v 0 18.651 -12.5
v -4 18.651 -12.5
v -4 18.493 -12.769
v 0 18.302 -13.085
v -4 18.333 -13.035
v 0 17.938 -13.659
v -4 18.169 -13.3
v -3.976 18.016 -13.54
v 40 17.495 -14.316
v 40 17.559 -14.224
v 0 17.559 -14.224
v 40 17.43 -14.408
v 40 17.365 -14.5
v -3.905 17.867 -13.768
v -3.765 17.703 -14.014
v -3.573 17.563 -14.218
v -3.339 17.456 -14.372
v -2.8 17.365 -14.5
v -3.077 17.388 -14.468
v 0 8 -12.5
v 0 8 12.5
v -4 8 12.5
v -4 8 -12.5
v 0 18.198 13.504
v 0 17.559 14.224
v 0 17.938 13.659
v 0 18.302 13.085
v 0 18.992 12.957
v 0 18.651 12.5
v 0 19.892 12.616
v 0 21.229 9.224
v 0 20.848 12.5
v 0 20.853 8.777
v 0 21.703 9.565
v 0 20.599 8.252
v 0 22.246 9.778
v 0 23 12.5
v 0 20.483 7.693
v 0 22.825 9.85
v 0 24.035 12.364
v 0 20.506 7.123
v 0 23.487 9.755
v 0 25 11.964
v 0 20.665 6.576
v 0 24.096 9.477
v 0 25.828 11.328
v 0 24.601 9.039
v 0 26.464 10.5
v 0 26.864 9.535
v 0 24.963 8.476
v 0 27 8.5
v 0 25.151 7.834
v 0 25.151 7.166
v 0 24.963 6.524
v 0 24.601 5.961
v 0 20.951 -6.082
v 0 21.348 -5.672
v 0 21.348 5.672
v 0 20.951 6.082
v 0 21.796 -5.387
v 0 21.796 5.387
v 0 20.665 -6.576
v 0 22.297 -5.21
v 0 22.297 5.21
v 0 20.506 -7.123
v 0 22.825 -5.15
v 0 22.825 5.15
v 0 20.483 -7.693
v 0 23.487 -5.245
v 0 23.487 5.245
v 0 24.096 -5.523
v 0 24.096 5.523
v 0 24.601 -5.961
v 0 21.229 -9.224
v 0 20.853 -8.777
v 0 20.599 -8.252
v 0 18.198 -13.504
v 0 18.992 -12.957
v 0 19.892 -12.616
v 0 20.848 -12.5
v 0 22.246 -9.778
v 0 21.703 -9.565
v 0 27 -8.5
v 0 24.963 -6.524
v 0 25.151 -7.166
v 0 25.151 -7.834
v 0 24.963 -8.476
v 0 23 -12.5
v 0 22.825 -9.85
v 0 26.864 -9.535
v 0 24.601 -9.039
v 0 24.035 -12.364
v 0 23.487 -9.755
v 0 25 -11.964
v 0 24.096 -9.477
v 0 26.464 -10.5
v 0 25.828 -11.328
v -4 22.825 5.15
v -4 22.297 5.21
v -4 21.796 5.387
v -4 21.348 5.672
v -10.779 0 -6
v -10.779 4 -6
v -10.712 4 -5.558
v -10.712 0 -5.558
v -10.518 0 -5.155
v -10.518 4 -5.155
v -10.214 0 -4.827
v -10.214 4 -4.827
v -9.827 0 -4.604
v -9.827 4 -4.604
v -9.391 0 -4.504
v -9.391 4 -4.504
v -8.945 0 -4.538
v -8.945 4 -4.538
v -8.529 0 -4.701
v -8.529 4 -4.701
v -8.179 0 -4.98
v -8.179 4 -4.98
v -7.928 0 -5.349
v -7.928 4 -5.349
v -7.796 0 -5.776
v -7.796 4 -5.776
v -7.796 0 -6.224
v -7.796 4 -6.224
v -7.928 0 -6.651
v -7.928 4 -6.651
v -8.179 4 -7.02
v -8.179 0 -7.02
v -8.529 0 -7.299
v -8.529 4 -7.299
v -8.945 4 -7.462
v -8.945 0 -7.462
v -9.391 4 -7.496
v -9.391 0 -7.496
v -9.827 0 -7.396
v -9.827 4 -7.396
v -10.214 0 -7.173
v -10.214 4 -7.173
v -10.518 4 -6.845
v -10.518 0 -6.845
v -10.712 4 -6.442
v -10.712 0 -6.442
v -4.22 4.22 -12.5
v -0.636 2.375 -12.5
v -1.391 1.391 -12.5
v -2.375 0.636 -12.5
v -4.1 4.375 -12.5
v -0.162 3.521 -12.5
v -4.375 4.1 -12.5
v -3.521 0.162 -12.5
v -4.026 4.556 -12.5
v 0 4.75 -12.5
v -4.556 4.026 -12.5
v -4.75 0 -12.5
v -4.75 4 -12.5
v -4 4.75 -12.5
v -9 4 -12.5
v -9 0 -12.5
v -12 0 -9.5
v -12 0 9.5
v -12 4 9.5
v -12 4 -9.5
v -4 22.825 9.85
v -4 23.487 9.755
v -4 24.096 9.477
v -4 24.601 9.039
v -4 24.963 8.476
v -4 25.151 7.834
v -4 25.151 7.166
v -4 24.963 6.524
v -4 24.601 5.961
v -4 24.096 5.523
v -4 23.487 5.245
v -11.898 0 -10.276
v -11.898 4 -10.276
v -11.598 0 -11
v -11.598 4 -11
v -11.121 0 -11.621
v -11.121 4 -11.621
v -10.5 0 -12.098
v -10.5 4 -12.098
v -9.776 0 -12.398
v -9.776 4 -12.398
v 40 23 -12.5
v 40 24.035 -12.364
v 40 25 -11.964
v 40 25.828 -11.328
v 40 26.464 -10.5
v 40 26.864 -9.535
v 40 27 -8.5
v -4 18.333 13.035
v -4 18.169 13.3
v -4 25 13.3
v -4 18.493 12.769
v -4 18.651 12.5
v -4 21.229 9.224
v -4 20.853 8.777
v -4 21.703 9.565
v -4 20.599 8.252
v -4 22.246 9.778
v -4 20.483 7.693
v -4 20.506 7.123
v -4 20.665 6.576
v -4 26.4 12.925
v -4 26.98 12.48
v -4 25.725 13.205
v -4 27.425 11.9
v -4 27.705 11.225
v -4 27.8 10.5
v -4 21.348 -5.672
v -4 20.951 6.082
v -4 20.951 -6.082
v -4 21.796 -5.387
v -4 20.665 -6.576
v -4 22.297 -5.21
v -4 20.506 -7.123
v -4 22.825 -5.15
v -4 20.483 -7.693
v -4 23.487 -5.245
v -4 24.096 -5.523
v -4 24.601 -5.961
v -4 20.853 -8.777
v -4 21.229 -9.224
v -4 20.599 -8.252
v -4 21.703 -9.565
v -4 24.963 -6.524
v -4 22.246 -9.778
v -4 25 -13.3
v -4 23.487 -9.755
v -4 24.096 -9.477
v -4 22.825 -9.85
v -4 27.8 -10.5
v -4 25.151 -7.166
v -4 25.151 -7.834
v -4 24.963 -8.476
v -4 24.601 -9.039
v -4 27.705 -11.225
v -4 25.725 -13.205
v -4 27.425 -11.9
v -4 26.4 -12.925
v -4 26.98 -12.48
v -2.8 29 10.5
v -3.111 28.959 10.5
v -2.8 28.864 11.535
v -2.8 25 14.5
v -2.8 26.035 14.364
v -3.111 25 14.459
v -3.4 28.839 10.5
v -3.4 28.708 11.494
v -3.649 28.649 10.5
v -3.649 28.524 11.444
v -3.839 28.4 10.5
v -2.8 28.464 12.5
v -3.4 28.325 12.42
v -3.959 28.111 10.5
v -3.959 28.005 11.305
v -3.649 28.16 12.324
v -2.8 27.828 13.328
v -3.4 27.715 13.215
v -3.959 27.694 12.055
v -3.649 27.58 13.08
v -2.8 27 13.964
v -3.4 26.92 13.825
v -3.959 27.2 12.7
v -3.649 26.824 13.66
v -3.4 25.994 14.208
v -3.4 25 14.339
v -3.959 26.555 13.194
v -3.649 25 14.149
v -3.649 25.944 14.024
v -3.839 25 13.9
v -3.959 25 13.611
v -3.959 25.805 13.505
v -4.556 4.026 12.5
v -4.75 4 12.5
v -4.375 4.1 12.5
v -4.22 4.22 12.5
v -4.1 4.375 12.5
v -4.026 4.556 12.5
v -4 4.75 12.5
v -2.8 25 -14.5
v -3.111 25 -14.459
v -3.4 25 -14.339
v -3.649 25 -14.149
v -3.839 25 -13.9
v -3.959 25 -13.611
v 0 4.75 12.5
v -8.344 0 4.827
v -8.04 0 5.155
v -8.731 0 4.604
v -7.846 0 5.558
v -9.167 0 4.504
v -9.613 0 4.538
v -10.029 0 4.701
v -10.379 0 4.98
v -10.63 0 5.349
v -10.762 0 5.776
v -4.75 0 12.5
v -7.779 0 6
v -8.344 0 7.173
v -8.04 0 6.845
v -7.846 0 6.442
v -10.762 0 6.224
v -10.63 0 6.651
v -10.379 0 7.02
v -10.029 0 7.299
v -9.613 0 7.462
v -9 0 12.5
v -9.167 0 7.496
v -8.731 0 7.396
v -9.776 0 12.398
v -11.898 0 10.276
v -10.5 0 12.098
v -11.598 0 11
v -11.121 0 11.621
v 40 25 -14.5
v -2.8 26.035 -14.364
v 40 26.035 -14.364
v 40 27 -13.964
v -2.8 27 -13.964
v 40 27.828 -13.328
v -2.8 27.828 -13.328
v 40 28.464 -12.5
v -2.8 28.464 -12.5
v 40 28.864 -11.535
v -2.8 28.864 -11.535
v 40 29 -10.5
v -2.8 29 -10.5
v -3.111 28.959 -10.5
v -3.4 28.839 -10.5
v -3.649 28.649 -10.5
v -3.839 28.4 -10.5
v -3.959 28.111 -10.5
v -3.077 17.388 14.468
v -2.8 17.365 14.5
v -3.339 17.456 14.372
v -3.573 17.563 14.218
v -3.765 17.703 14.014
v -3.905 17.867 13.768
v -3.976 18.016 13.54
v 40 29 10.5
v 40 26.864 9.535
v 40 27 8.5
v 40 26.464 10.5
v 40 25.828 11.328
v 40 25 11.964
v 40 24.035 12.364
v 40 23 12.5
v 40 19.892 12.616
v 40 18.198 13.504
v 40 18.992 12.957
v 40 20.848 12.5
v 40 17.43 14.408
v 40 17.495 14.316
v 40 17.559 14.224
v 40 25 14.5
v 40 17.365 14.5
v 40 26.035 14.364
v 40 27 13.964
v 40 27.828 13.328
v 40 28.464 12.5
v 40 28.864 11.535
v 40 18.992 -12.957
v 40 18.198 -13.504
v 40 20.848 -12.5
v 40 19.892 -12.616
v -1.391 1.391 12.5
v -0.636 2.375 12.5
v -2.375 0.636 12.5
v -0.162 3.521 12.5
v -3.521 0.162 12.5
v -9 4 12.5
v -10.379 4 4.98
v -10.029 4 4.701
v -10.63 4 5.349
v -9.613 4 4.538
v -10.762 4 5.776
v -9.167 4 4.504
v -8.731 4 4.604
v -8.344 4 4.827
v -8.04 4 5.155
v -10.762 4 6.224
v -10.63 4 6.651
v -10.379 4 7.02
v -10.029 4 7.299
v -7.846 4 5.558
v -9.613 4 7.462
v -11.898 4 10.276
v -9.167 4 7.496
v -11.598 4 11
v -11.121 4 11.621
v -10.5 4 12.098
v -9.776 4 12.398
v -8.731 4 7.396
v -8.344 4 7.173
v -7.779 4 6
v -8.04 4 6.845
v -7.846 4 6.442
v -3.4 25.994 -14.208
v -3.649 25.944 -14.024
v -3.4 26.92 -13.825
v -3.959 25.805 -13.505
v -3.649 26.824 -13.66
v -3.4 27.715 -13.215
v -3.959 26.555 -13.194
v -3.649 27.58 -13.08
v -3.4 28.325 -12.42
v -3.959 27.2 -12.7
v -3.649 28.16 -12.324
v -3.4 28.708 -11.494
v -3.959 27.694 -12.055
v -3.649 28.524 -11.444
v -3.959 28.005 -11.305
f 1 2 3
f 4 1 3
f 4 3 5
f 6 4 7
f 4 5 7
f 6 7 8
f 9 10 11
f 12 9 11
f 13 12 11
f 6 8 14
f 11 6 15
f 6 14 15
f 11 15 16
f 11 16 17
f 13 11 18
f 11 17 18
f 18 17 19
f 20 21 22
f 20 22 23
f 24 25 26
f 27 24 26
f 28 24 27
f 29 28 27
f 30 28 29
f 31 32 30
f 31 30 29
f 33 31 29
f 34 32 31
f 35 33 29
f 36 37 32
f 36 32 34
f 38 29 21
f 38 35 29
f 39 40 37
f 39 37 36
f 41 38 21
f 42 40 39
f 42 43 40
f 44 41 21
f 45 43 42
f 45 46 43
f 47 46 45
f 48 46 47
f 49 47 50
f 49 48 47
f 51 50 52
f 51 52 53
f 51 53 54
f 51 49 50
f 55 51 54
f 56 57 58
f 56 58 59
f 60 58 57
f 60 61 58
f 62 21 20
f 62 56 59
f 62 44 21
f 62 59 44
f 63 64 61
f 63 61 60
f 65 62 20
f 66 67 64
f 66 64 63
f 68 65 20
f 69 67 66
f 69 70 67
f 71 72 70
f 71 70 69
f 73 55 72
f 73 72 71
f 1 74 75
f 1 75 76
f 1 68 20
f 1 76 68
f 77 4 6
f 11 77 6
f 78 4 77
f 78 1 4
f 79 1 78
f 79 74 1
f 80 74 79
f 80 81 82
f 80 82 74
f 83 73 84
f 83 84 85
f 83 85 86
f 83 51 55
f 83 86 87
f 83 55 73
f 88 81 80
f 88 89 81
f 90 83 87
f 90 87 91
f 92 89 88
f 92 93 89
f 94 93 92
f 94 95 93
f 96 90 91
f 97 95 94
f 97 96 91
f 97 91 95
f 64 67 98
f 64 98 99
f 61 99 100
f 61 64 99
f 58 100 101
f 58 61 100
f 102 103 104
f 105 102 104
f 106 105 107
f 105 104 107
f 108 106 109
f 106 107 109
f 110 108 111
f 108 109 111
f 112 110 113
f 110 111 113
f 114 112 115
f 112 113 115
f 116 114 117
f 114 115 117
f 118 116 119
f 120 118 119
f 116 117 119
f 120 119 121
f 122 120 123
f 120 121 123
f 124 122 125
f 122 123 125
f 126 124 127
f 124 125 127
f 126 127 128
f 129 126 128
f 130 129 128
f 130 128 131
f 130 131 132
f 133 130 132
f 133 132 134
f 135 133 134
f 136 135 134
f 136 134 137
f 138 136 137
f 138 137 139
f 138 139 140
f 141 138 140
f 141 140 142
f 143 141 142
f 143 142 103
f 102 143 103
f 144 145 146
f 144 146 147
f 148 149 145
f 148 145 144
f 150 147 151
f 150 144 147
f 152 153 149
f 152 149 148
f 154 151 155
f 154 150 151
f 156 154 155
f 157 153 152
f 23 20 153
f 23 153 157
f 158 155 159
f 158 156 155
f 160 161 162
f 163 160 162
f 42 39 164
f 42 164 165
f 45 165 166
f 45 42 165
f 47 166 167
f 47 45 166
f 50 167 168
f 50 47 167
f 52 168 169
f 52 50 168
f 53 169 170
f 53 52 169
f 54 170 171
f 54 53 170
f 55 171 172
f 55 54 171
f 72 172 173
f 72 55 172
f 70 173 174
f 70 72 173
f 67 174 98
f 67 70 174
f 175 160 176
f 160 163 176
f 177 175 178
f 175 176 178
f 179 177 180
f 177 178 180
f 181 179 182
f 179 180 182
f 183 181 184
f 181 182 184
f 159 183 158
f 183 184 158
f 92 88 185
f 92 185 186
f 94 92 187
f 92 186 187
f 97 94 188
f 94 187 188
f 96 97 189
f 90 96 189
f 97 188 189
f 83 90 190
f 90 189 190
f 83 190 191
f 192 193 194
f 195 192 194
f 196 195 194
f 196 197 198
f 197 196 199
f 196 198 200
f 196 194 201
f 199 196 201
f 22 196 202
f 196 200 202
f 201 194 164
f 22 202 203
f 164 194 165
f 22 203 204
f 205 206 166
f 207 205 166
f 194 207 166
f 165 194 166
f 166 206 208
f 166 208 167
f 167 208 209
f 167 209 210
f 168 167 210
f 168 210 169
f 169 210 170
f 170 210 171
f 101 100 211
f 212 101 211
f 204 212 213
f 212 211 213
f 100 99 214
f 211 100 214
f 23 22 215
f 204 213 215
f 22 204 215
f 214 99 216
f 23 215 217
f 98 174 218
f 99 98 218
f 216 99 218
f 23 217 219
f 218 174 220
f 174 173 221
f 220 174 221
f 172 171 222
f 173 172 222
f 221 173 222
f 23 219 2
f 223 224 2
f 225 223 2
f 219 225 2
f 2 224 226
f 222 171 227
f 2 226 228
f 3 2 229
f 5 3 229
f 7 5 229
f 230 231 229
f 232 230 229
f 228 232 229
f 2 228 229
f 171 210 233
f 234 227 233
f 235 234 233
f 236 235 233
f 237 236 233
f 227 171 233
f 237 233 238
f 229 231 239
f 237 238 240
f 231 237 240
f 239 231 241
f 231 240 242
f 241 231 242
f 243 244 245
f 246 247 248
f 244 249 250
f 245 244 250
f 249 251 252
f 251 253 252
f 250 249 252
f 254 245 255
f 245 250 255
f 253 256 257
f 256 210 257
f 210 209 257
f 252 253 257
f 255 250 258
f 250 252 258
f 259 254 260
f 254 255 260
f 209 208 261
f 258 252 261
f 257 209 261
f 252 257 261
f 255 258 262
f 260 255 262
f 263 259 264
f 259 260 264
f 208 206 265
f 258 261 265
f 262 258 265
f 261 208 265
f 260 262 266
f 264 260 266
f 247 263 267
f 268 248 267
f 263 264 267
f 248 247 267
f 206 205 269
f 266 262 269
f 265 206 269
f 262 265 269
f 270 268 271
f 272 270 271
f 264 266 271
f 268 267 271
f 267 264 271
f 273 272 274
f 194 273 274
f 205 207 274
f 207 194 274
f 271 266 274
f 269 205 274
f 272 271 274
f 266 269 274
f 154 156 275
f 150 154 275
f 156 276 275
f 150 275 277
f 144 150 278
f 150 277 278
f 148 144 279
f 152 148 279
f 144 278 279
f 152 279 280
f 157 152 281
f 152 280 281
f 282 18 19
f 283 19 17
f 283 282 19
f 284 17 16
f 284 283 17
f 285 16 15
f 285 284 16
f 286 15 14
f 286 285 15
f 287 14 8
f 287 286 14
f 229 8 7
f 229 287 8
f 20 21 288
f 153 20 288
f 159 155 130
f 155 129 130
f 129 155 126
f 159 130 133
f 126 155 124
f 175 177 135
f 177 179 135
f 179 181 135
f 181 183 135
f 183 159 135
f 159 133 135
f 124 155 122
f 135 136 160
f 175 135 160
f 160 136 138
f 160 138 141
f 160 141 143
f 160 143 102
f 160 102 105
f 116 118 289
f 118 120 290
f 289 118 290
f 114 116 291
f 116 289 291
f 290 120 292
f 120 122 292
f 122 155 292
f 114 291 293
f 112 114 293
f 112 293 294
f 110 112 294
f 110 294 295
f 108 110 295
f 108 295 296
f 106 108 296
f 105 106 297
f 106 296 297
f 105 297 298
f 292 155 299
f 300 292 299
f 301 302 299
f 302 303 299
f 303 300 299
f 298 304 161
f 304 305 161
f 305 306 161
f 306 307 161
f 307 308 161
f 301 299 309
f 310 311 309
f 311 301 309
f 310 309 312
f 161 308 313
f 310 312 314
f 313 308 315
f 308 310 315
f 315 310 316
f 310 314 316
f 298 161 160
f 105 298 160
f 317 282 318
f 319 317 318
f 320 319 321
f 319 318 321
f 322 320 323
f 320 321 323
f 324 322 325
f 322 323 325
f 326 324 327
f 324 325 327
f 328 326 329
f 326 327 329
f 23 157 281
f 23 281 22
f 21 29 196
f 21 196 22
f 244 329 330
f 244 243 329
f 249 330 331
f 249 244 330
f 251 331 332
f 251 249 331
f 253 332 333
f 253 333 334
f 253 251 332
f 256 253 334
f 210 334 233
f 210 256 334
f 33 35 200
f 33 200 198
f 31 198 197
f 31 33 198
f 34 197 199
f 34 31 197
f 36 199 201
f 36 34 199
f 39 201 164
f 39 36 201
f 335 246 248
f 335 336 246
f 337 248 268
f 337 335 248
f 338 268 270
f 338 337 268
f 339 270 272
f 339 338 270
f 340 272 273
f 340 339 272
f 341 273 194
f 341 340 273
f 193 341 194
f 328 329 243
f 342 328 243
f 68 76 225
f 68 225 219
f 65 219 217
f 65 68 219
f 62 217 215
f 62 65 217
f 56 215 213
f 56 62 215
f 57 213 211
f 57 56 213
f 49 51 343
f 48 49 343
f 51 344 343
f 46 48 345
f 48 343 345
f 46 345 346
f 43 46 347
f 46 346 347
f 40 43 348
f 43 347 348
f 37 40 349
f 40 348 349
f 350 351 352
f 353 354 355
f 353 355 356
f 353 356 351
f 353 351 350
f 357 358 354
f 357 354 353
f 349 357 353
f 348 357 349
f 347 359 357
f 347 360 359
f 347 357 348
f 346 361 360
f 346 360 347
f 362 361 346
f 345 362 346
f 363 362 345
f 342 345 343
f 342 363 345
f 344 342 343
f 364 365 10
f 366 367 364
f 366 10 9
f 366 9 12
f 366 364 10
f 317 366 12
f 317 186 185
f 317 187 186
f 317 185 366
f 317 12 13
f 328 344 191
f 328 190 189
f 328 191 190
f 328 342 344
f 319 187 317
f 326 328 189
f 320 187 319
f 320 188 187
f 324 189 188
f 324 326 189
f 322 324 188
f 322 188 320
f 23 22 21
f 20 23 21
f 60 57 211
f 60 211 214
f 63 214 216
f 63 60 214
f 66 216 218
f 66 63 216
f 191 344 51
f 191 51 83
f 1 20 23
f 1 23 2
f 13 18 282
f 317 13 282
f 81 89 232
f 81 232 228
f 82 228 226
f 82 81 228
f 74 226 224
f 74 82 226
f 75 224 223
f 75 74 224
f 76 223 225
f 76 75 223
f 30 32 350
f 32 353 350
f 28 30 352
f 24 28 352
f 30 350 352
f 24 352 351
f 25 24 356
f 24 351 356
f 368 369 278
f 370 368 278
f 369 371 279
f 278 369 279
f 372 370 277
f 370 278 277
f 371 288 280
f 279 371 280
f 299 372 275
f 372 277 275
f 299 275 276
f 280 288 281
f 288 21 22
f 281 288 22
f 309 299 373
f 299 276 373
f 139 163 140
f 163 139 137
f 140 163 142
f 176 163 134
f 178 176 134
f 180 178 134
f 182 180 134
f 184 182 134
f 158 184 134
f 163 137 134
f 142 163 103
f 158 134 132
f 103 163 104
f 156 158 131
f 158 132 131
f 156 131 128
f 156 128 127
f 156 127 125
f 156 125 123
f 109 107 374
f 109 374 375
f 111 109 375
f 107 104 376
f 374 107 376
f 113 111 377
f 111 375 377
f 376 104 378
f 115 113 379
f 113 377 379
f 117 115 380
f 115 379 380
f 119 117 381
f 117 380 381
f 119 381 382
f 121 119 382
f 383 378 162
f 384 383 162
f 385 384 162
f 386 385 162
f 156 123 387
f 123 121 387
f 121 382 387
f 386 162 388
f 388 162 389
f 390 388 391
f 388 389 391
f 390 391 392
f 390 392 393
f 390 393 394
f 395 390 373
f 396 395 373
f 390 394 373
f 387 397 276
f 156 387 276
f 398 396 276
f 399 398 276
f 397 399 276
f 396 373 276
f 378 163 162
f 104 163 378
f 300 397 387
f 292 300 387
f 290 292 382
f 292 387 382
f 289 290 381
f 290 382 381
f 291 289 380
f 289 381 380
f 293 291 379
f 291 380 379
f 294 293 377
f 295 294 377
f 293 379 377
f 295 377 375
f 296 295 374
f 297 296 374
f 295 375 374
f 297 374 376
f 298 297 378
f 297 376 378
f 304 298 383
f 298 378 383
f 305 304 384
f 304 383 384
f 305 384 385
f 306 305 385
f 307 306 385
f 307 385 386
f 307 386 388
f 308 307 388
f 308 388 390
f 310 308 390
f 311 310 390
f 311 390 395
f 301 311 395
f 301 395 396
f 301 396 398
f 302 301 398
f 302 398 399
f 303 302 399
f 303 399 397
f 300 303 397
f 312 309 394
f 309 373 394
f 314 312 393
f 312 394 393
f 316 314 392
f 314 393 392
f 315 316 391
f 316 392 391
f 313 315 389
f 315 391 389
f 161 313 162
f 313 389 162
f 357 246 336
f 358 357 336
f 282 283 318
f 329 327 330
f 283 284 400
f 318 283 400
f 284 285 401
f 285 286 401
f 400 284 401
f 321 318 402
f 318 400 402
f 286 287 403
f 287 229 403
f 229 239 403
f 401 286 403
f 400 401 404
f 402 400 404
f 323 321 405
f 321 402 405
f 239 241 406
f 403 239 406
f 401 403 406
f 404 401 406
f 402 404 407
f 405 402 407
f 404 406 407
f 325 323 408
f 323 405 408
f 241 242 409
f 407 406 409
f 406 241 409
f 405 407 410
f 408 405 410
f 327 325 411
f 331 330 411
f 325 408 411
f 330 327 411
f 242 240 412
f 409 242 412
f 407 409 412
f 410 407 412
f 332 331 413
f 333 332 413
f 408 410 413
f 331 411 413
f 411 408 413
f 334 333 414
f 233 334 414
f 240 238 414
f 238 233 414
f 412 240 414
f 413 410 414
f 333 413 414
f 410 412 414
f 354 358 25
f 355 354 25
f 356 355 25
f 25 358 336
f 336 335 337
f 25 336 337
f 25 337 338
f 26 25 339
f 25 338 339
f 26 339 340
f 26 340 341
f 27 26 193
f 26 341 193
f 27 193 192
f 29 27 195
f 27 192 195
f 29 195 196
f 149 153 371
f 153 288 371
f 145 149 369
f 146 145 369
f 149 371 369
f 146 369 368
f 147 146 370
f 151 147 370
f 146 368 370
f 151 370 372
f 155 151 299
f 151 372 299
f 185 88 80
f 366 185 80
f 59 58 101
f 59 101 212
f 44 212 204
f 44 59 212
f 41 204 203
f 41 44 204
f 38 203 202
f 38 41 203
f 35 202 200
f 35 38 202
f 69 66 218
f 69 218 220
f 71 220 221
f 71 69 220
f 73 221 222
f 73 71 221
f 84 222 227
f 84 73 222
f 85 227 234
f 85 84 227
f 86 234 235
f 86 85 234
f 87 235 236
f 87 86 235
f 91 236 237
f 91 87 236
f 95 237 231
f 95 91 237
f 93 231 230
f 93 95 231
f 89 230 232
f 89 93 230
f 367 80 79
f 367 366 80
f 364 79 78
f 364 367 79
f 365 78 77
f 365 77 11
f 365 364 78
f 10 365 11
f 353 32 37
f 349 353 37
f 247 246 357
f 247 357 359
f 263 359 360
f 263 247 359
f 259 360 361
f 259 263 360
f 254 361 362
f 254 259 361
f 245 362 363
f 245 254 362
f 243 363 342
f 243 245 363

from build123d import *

# Parameters (mm, degrees)
BASE_FLANGE1_DEPTH  = 12.5
FILLET1_R           = 3
SKETCH6_R           = 1.5
CUT_EXTRUDE1_DEPTH  = 18.783419244
BOSS_EXTRUDE1_DEPTH = 4
BOSS_EXTRUDE3_DEPTH = 40
FILLET2_R           = 4
FILLET3_R           = 1.2


# Sheet-metal steps are written as plain solids
with BuildPart() as part:
    # Sketch1 → Base-Flange1 (new, symmetric)
    with BuildSketch(Plane.XY):
        with BuildLine():
            Line((0, 8), (0, 4.75))
            ThreePointArc((0, 4.75), (-1.391242789, 1.391242789), (-4.75, 0))
            Line((-4.75, 0), (-12, 0))
            Line((-12, 0), (-12, 4))
            Line((-12, 4), (-4.75, 4))
            ThreePointArc((-4.75, 4), (-4.219669914, 4.219669914), (-4, 4.75))
            Line((-4, 4.75), (-4, 8))
            Line((-4, 8), (0, 8))
        make_face()
    extrude(amount=BASE_FLANGE1_DEPTH, both=True)

    # Fillet1
    fillet1_edges = [part.edges().sort_by_distance(p)[0] for p in [
        (-12, 2, 12.5),
        (-12, 2, -12.5),
    ]]
    fillet(fillet1_edges, radius=FILLET1_R)

    # Sketch6 → Cut-Extrude1 (cut, through all)
    with BuildSketch(Plane(origin=(0, 4, 0), x_dir=(1, 0, 0), z_dir=(0, 1, 0))):
        with Locations(Location((-9.278968908, 6, 0), (0, 0, 180))):
            Circle(SKETCH6_R)
        with Locations((-9.278968908, -6)):
            Circle(SKETCH6_R)
    extrude(amount=-CUT_EXTRUDE1_DEPTH, mode=Mode.SUBTRACT)


with BuildPart() as body_2:
    # Sketch8 → Boss-Extrude1 (new body)
    with BuildSketch(Plane(origin=(0, 0, 0), x_dir=(0, 0, -1), z_dir=(1, 0, 0))):
        Polygon((-12.5, 18.650635095), (-12.5, 17.365411854), (-12.5, 8), (12.5, 8), (12.5, 17.365411854), (12.5, 18.650635095), align=None)
        with BuildLine():
            ThreePointArc((-8.251909394, 20.598855721), (-10.42157986, 19.724230971), (-12.5, 18.650635095))
            Line((-12.5, 18.650635095), (12.5, 18.650635095))
            ThreePointArc((12.5, 18.650635095), (10.42157986, 19.724230971), (8.251909394, 20.598855721))
            ThreePointArc((8.251909394, 20.598855721), (6.844608492, 20.568558373), (5.672455033, 21.347962007))
            ThreePointArc((5.672455033, 21.347962007), (0, 22), (-5.672455033, 21.347962007))
            ThreePointArc((-5.672455033, 21.347962007), (-6.844608492, 20.568558373), (-8.251909394, 20.598855721))
        make_face()
        with BuildLine():
            Line((-12.5, 27), (-12.5, 22.825317547))
            Line((-12.5, 22.825317547), (-9.85, 22.825317547))
            ThreePointArc((-9.85, 22.825317547), (-7.5, 25.175317547), (-5.15, 22.825317547))
            Line((-5.15, 22.825317547), (5.15, 22.825317547))
            ThreePointArc((5.15, 22.825317547), (7.5, 25.175317547), (9.85, 22.825317547))
            Line((9.85, 22.825317547), (12.5, 22.825317547))
            Line((12.5, 22.825317547), (12.5, 27))
            Line((12.5, 27), (-12.5, 27))
        make_face()
        with BuildLine():
            ThreePointArc((8.251909394, 20.598855721), (10.42157986, 19.724230971), (12.5, 18.650635095))
            Line((12.5, 18.650635095), (12.5, 22.825317547))
            Line((12.5, 22.825317547), (9.85, 22.825317547))
            ThreePointArc((9.85, 22.825317547), (9.409121143, 21.455005006), (8.251909394, 20.598855721))
        make_face()
        with BuildLine():
            ThreePointArc((-5.15, 22.825317547), (-5.284460486, 22.041809626), (-5.672455033, 21.347962007))
            ThreePointArc((-5.672455033, 21.347962007), (0, 22), (5.672455033, 21.347962007))
            ThreePointArc((5.672455033, 21.347962007), (5.284460486, 22.041809626), (5.15, 22.825317547))
            Line((5.15, 22.825317547), (-5.15, 22.825317547))
        make_face()
        with BuildLine():
            Line((-12.5, 22.825317547), (-12.5, 18.650635095))
            ThreePointArc((-12.5, 18.650635095), (-10.42157986, 19.724230971), (-8.251909394, 20.598855721))
            ThreePointArc((-8.251909394, 20.598855721), (-9.409121143, 21.455005006), (-9.85, 22.825317547))
            Line((-9.85, 22.825317547), (-12.5, 22.825317547))
        make_face()
        Polygon((-14.5, 29), (-14.5, 22.825317547), (-12.5, 22.825317547), (-12.5, 27), (12.5, 27), (12.5, 22.825317547), (14.5, 22.825317547), (14.5, 29), align=None)
        with BuildLine():
            Line((12.5, 22.825317547), (12.5, 18.650635095))
            ThreePointArc((12.5, 18.650635095), (13.515285779, 18.031810438), (14.5, 17.365411854))
            Line((14.5, 17.365411854), (14.5, 18.650635095))
            Line((14.5, 18.650635095), (14.5, 22.825317547))
            Line((14.5, 22.825317547), (12.5, 22.825317547))
        make_face()
        with BuildLine():
            Line((-14.5, 22.825317547), (-14.5, 18.650635095))
            Line((-14.5, 18.650635095), (-14.5, 17.365411854))
            ThreePointArc((-14.5, 17.365411854), (-13.515285779, 18.031810438), (-12.5, 18.650635095))
            Line((-12.5, 18.650635095), (-12.5, 22.825317547))
            Line((-12.5, 22.825317547), (-14.5, 22.825317547))
        make_face()
    extrude(amount=-BOSS_EXTRUDE1_DEPTH)

    # Sketch8<4> → Boss-Extrude3 (add)
    with BuildSketch(Plane(origin=(0, 0, 0), x_dir=(0, 0, -1), z_dir=(1, 0, 0))):
        Polygon((-14.5, 29), (-14.5, 22.825317547), (-12.5, 22.825317547), (-12.5, 27), (12.5, 27), (12.5, 22.825317547), (14.5, 22.825317547), (14.5, 29), align=None)
        with BuildLine():
            Line((-14.5, 22.825317547), (-14.5, 18.650635095))
            Line((-14.5, 18.650635095), (-14.5, 17.365411854))
            ThreePointArc((-14.5, 17.365411854), (-13.515285779, 18.031810438), (-12.5, 18.650635095))
            Line((-12.5, 18.650635095), (-12.5, 22.825317547))
            Line((-12.5, 22.825317547), (-14.5, 22.825317547))
        make_face()
        with BuildLine():
            Line((12.5, 22.825317547), (12.5, 18.650635095))
            ThreePointArc((12.5, 18.650635095), (13.515285779, 18.031810438), (14.5, 17.365411854))
            Line((14.5, 17.365411854), (14.5, 18.650635095))
            Line((14.5, 18.650635095), (14.5, 22.825317547))
            Line((14.5, 22.825317547), (12.5, 22.825317547))
        make_face()
    extrude(amount=BOSS_EXTRUDE3_DEPTH)

    # Fillet2
    fillet2_edges = [body_2.edges().sort_by_distance(p)[0] for p in [
        (18, 29, 14.5),
        (18, 29, -14.5),
        (20, 18.650635095, 12.5),
        (20, 27, 12.5),
        (20, 27, -12.5),
        (20, 18.650635095, -12.5),
    ]]
    fillet(fillet2_edges, radius=FILLET2_R)

    # Fillet3
    fillet3_edges = [body_2.edges().sort_by_distance(p)[0] for p in [
        (-4, 21.182705927, 14.5),
        (-4, 29, 0),
        (-4, 21.182705927, -14.5),
        (-4, 27.828427125, -13.328427125),
        (-4, 27.828427125, 13.328427125),
    ]]
    fillet(fillet3_edges, radius=FILLET3_R)


solid = Compound([part.part, body_2.part])
